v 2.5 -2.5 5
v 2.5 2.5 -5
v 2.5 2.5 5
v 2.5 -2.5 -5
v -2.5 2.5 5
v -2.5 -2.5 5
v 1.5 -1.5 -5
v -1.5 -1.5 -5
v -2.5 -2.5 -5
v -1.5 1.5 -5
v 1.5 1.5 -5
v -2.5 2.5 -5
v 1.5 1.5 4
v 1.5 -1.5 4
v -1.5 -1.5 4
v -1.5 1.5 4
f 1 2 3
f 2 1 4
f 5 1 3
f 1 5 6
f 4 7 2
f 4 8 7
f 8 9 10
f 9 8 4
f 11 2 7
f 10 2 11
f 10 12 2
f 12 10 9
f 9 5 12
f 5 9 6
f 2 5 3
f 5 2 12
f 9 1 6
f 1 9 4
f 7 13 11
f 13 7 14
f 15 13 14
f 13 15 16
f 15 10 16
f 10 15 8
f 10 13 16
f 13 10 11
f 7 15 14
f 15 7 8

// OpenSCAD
difference() {
    cube([5,5,10],center=true);
    translate([0,0,-1])cube([5-2,5-2,10],center=true);
}
